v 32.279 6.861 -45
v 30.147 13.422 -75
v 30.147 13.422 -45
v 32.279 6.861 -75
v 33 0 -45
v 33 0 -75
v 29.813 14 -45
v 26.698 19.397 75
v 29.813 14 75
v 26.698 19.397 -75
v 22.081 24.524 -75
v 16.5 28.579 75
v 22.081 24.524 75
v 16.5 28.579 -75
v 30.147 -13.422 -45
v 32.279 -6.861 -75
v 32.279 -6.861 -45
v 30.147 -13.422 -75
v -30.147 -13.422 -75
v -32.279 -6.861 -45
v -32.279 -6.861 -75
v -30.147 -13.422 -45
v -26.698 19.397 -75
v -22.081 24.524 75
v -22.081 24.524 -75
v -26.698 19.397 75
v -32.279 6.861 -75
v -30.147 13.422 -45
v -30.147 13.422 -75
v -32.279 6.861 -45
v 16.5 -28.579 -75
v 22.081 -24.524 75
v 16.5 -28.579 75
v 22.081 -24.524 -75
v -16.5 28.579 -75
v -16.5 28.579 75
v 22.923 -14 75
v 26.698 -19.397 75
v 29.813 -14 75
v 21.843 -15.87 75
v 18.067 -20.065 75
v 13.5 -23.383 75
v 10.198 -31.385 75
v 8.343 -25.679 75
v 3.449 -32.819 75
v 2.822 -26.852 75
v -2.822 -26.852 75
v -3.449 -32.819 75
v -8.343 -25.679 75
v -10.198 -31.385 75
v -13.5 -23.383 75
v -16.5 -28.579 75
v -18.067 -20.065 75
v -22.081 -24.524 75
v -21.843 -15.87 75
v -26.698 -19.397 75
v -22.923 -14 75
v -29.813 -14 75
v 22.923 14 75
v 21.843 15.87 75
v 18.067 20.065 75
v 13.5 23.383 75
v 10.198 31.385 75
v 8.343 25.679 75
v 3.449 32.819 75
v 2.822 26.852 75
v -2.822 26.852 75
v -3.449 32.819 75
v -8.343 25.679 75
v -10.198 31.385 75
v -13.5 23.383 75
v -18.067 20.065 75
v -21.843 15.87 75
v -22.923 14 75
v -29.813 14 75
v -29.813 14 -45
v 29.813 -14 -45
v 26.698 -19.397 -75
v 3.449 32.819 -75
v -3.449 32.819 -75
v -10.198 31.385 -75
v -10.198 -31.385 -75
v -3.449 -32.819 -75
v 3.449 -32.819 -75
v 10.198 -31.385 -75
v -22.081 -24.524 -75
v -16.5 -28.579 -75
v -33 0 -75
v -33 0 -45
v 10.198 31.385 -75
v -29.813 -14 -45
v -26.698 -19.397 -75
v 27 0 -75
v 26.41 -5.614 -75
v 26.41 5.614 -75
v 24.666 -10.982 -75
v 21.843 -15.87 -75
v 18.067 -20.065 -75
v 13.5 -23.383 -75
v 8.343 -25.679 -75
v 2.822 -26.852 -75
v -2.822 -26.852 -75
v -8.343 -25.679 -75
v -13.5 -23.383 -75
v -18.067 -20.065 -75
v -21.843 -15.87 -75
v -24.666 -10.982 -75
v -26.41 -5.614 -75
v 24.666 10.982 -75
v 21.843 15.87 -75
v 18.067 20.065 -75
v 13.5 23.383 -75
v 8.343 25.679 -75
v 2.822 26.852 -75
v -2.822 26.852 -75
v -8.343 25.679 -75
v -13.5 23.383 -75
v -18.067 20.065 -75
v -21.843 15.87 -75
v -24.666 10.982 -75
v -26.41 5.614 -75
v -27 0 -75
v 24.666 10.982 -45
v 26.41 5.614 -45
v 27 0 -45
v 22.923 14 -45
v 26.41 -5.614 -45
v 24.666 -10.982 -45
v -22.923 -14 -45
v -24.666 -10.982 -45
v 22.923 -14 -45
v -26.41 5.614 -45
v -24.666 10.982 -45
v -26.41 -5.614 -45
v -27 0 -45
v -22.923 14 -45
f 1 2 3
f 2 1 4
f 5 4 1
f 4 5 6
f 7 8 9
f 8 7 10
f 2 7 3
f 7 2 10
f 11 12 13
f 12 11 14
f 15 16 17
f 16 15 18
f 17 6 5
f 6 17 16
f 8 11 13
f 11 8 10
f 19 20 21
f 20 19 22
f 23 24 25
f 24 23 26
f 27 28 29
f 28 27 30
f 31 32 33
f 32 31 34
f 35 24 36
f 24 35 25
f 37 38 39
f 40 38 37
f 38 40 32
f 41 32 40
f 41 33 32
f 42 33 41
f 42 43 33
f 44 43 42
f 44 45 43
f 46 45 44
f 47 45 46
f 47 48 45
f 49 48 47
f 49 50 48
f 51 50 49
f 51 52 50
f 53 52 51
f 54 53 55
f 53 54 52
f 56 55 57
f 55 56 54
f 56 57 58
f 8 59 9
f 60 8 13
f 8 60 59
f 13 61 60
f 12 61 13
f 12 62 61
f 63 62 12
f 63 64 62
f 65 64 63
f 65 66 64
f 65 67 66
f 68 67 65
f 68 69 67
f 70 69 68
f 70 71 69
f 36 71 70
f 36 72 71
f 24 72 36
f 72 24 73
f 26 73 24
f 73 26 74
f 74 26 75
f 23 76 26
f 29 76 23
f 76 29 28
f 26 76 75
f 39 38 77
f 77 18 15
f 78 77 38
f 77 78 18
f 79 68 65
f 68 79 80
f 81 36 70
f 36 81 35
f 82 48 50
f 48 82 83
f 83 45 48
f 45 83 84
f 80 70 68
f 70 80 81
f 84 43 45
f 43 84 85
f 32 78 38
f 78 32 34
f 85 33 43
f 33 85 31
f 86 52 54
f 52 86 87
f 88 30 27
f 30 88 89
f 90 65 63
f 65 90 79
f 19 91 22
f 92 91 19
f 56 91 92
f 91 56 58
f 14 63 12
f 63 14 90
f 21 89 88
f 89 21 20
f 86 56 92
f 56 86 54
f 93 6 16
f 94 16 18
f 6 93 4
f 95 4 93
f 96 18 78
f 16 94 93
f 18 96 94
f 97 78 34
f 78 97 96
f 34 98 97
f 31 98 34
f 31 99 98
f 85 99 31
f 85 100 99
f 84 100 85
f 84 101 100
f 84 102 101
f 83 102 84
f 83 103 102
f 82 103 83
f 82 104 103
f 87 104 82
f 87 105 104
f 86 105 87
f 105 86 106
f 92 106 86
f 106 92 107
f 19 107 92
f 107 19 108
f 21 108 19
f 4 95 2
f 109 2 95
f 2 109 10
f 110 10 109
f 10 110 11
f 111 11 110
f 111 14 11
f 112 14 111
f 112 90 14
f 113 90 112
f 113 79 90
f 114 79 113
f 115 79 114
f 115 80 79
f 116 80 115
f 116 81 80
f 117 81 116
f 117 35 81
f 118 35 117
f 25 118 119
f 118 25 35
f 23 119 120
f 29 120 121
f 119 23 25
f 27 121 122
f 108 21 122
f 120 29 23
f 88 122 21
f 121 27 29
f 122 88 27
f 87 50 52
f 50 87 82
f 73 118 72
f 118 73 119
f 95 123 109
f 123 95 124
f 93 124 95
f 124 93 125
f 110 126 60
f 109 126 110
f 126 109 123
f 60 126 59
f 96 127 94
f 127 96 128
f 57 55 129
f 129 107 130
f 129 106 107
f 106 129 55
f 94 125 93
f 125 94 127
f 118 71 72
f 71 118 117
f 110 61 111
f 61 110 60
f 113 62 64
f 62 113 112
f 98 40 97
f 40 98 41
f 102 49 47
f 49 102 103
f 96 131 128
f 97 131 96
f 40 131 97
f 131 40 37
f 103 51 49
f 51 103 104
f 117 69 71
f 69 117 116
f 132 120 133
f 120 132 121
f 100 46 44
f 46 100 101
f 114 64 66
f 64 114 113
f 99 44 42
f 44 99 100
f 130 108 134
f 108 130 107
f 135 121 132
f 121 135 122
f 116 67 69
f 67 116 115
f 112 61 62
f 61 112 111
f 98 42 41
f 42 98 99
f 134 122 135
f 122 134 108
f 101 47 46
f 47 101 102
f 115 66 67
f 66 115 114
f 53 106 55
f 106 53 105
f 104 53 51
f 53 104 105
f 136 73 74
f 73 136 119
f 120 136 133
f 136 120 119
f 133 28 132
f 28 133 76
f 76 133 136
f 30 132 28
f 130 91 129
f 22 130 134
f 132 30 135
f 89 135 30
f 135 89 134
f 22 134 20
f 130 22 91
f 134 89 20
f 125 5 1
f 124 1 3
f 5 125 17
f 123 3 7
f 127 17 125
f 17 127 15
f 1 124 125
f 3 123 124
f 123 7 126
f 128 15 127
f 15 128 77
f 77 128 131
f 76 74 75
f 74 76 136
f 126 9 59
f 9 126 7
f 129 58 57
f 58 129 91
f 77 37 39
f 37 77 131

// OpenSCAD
//Turbidostat
//Chamber
//Top Part
//by: Agostino Guarino agostinoguarino@gmail.com


//Dimensions of the Test Tube, in mm
ttube_ext_diam=25; 
ttube_height=150;

//Structure Dimensions
tube_tolerance=2; //gap between the tube and the holder
support_ext_diam=ttube_ext_diam+8;
base_thickness=15;
hole_base=14;
hole_height=60;

difference(){
    difference(){
        
        cylinder(h = ttube_height, r1 = support_ext_diam, r2 = support_ext_diam, center = true);
        
        cylinder(h = ttube_height, r1 = ttube_ext_diam+tube_tolerance,     r2 = ttube_ext_diam+tube_tolerance, center = true);
            
    }
    translate([0,0,15])cube([support_ext_diam*2,hole_base*2,hole_height*2],true);
}
